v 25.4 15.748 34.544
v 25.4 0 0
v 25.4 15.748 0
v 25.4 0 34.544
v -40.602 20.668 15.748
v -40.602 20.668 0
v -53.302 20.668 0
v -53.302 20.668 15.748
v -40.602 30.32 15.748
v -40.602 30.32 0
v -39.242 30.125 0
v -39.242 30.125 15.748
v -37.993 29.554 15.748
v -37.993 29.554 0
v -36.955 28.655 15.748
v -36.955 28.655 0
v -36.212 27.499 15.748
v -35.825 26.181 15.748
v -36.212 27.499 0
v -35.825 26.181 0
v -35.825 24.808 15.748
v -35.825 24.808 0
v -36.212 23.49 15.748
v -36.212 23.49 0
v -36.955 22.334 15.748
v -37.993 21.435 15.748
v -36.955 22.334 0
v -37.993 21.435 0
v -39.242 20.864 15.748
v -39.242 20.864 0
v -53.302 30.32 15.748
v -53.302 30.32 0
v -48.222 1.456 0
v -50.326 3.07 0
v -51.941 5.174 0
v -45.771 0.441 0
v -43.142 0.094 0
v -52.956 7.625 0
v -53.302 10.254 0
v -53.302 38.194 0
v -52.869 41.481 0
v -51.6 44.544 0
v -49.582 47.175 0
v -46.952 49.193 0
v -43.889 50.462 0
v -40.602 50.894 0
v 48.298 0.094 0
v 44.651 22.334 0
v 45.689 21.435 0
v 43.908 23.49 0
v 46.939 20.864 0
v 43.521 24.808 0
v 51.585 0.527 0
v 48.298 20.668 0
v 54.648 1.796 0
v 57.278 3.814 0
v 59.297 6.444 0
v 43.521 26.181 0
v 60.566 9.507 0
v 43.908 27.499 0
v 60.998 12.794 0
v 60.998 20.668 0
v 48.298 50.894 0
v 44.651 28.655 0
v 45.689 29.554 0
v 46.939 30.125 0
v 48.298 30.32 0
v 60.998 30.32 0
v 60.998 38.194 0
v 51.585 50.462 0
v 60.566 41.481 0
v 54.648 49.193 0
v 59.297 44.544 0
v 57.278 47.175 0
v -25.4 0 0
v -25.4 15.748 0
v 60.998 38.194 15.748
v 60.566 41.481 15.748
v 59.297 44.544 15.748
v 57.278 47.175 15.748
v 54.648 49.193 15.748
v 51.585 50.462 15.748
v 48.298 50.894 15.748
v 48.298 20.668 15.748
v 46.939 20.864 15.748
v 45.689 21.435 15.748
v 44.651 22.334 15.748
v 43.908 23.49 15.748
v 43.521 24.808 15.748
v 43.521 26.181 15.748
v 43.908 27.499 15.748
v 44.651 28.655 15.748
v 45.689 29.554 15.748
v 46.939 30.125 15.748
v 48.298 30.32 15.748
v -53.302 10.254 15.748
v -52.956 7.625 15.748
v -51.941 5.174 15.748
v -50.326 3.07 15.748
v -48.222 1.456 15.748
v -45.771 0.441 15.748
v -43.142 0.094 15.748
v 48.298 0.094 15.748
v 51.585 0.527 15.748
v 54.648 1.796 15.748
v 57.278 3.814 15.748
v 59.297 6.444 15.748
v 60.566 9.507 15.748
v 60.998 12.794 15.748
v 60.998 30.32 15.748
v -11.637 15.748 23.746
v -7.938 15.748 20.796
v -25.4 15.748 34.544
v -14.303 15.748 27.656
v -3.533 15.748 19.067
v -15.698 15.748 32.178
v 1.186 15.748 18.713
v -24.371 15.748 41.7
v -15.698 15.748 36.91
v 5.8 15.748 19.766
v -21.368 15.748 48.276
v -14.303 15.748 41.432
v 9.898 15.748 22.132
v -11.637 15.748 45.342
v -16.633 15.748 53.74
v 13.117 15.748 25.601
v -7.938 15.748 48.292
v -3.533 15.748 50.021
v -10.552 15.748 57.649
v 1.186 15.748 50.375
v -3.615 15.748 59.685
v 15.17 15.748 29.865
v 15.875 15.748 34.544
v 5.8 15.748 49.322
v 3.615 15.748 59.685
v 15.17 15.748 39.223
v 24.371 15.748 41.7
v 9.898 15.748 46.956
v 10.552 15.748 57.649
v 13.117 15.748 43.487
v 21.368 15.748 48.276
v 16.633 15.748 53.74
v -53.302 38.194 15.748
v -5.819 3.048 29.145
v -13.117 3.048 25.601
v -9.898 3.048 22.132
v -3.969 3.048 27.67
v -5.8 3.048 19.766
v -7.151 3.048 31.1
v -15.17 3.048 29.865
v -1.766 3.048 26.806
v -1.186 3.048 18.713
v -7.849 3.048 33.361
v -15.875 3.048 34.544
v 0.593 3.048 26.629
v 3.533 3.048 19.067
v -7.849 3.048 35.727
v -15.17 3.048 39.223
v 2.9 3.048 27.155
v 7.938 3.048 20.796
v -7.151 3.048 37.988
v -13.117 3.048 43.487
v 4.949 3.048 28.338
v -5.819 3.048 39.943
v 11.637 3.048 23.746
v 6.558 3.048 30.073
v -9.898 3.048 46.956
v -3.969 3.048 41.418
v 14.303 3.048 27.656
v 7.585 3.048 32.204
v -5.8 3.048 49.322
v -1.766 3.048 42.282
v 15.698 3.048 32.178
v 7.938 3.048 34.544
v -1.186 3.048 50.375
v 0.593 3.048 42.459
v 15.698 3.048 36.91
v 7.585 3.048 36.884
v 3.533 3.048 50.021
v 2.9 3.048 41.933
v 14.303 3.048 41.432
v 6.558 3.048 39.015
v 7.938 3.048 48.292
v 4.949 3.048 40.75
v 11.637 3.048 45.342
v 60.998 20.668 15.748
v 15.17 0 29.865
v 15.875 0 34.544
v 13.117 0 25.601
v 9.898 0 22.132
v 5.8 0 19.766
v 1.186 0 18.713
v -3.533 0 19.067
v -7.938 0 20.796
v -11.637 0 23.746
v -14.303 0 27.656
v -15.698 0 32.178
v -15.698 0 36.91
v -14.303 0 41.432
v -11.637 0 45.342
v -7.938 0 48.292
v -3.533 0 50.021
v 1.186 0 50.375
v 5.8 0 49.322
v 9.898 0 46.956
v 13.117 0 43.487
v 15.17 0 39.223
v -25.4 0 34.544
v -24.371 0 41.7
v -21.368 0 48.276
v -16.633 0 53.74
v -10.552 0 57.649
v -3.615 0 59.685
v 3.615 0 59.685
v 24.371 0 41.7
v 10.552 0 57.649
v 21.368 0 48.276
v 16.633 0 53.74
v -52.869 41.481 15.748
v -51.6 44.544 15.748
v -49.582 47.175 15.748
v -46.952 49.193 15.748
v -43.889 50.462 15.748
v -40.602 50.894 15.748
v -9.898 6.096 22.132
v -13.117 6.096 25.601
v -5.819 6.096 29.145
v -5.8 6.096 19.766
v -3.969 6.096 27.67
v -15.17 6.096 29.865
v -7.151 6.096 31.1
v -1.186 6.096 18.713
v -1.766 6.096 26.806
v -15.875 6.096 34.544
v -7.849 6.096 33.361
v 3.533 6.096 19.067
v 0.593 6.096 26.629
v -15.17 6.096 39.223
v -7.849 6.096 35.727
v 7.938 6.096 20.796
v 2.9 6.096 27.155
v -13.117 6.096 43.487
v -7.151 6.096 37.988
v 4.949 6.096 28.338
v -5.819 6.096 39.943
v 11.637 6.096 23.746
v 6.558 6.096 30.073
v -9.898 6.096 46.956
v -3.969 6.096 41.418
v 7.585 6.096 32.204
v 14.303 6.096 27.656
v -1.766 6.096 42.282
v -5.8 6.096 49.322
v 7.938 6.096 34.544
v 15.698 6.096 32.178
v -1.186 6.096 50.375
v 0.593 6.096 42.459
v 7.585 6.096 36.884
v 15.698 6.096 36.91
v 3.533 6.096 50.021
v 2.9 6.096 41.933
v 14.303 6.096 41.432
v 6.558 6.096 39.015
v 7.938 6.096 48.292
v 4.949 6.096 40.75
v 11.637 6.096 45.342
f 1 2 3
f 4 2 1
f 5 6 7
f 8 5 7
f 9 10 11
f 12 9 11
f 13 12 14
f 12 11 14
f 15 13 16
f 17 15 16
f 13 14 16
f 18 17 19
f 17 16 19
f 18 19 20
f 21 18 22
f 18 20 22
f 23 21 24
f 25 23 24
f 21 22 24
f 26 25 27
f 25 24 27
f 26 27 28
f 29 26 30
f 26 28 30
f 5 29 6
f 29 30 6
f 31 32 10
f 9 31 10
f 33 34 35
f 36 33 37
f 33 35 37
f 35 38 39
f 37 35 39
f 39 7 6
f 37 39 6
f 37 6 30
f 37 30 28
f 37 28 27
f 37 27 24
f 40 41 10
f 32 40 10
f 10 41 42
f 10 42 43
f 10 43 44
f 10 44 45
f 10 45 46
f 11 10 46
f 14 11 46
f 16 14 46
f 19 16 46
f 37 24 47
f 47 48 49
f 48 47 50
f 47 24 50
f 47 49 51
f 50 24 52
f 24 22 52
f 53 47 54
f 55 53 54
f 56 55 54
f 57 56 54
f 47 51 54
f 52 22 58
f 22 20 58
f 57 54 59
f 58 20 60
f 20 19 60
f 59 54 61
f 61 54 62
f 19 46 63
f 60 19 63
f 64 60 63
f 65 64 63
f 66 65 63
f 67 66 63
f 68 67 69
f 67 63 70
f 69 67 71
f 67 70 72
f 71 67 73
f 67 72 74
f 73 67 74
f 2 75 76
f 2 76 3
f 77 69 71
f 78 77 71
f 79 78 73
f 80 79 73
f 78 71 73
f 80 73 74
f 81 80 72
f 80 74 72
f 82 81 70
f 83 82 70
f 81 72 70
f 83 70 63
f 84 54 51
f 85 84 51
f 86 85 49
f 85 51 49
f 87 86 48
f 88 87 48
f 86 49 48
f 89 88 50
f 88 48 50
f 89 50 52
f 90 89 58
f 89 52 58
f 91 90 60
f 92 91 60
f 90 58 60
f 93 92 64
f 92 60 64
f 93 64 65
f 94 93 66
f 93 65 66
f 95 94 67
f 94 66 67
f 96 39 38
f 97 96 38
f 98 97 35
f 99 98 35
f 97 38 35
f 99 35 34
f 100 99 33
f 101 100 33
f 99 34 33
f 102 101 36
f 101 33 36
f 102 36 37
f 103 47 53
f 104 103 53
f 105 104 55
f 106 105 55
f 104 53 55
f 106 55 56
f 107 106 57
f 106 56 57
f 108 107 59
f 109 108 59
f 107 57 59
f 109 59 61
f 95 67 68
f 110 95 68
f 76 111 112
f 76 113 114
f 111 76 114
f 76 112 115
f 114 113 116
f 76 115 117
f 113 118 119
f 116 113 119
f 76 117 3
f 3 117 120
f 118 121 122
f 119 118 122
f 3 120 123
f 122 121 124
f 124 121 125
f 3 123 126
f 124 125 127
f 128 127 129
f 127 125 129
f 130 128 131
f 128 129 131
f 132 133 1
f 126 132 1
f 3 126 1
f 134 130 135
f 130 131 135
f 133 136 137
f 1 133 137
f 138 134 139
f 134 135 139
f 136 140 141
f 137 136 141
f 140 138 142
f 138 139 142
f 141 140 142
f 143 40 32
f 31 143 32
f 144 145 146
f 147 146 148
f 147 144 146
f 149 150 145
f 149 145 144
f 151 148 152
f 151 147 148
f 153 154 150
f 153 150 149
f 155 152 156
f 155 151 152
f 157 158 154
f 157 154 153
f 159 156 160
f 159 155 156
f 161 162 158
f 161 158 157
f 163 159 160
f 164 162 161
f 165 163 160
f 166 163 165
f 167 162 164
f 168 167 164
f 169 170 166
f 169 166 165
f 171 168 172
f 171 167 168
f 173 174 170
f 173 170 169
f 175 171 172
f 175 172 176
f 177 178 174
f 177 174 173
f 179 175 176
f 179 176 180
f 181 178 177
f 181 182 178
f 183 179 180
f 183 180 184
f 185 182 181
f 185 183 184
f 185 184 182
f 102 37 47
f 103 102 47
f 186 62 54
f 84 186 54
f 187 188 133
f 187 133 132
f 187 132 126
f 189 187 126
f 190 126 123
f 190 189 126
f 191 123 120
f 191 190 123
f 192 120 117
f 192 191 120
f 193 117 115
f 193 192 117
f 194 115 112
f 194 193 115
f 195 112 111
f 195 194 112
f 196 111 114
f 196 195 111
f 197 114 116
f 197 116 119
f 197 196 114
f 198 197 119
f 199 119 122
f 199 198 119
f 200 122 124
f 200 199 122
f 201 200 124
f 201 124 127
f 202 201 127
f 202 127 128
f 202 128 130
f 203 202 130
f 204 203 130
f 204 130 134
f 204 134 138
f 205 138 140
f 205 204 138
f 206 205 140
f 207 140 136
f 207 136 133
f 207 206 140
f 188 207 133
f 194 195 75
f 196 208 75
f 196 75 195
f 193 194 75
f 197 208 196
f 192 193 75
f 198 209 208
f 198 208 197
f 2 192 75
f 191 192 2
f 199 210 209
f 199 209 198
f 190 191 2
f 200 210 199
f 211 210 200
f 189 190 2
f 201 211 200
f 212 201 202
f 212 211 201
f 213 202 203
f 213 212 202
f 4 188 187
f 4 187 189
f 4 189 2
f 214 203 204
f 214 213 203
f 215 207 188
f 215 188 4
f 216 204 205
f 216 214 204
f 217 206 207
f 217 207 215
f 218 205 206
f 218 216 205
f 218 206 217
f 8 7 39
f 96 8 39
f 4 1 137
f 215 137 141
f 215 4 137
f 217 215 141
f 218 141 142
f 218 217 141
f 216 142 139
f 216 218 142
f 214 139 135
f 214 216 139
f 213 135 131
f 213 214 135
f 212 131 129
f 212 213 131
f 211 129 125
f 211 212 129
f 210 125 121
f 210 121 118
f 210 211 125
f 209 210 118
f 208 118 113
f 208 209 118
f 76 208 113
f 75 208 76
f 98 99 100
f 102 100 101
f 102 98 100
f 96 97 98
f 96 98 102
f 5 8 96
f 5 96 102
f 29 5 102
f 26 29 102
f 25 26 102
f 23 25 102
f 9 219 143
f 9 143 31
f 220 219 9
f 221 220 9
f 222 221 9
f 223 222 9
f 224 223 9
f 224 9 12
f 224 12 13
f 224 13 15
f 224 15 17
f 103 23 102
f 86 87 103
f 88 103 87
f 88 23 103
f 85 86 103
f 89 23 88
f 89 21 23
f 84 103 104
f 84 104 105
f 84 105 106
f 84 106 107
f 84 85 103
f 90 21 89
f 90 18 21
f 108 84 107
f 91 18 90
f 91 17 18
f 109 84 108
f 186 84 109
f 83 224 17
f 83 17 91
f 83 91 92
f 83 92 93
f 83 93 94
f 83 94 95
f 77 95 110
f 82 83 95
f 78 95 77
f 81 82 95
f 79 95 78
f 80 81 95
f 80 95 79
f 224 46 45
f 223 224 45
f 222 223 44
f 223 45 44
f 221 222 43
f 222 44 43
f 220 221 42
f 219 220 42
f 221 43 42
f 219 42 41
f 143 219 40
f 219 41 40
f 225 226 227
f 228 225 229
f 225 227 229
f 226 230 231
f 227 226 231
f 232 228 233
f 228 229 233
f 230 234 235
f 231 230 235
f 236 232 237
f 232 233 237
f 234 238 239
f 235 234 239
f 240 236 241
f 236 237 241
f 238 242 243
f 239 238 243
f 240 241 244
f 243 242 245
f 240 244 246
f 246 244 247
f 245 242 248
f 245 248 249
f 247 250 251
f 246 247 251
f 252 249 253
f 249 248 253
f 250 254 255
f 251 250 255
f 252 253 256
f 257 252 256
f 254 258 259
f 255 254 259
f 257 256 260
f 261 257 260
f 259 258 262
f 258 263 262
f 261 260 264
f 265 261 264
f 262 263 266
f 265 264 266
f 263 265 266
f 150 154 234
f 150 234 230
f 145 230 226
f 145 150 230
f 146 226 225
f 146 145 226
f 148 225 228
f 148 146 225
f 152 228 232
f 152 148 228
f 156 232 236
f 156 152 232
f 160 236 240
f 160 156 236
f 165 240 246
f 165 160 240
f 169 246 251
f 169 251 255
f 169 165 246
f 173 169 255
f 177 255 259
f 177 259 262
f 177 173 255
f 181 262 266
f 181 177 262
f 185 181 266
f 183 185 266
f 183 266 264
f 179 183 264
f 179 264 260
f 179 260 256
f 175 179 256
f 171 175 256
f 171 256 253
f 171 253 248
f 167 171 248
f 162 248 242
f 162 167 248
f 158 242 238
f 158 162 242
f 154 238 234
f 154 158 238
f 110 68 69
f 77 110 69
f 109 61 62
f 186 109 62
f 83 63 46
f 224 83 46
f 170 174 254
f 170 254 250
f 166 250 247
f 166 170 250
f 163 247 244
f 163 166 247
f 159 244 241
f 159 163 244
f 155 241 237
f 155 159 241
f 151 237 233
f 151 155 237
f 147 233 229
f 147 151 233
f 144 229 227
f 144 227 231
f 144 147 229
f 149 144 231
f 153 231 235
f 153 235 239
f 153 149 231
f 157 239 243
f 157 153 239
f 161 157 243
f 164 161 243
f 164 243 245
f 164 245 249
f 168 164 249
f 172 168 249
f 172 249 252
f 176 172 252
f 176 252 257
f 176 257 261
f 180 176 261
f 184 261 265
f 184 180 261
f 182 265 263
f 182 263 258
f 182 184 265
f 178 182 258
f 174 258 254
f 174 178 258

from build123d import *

# Parameters (mm, degrees)
F2_DEPTH = 15.748
F3_DEPTH = 15.748
F4_DEPTH = 3.048
F5_DEPTH = 3.048


with BuildPart() as f2:
    # F0 (on Top) → F2 (new body)
    with BuildSketch(Plane.XY):
        with BuildLine():
            ThreePointArc((-53.3017574266, 10.254479922), (-50.3259623234, 3.0702750251), (-43.1417574266, 0.094479922))
            Line((-43.1417574266, 0.094479922), (48.2982425734, 0.094479922))
            ThreePointArc((48.2982425734, 0.094479922), (57.2784986945, 3.8142238009), (60.9982425734, 12.794479922))
            Line((60.9982425734, 12.794479922), (60.9982425734, 20.668479922))
            Line((60.9982425734, 20.668479922), (48.2982425734, 20.668479922))
            ThreePointArc((48.2982425734, 20.668479922), (43.4722425734, 25.494479922), (48.2982425734, 30.320479922))
            Line((48.2982425734, 30.320479922), (60.9982425734, 30.320479922))
            Line((60.9982425734, 30.320479922), (60.9982425734, 38.194479922))
            ThreePointArc((60.9982425734, 38.194479922), (57.2784986945, 47.1747360431), (48.2982425734, 50.894479922))
            Line((48.2982425734, 50.894479922), (-40.6017574266, 50.894479922))
            ThreePointArc((-40.6017574266, 50.894479922), (-49.5820135476, 47.1747360431), (-53.3017574266, 38.194479922))
            Line((-53.3017574266, 38.194479922), (-53.3017574266, 30.320479922))
            Line((-53.3017574266, 30.320479922), (-40.6017574266, 30.320479922))
            ThreePointArc((-40.6017574266, 30.320479922), (-35.7757574266, 25.494479922), (-40.6017574266, 20.668479922))
            Line((-40.6017574266, 20.668479922), (-53.3017574266, 20.668479922))
            Line((-53.3017574266, 20.668479922), (-53.3017574266, 10.254479922))
        make_face()
    extrude(amount=F2_DEPTH)


with BuildPart() as f3:
    # F1 (on Front) → F3 (new body)
    with BuildSketch(Plane.XZ):
        with BuildLine():
            ThreePointArc((25.4, 34.544), (0, 59.944), (-25.4, 34.544))
            Line((-25.4, 34.544), (-15.875, 34.544))
            ThreePointArc((-15.875, 34.544), (0, 50.419), (15.875, 34.544))
            Line((15.875, 34.544), (25.4, 34.544))
        make_face()
        with BuildLine():
            Line((-25.4, 34.544), (-25.4, 0))
            Line((-25.4, 0), (25.4, 0))
            Line((25.4, 0), (25.4, 34.544))
            Line((25.4, 34.544), (15.875, 34.544))
            ThreePointArc((15.875, 34.544), (0, 18.669), (-15.875, 34.544))
            Line((-15.875, 34.544), (-25.4, 34.544))
        make_face()
    extrude(amount=-F3_DEPTH)


with BuildPart() as f4:
    # F1 (on Front) → F4 (new body)
    with BuildSketch(Plane.XZ):
        with BuildLine():
            Line((7.9375, 34.544), (-7.9375, 34.544))
            ThreePointArc((-7.9375, 34.544), (0, 26.6065), (7.9375, 34.544))
        make_face()
        with BuildLine():
            ThreePointArc((7.9375, 34.544), (0, 42.4815), (-7.9375, 34.544))
            Line((-7.9375, 34.544), (7.9375, 34.544))
        make_face()
    extrude(amount=-F4_DEPTH)


with BuildPart() as f5:
    # F1 (on Front) → F5 (new body)
    with BuildSketch(Plane.XZ):
        with BuildLine():
            ThreePointArc((15.875, 34.544), (0, 50.419), (-15.875, 34.544))
            Line((-15.875, 34.544), (-7.9375, 34.544))
            ThreePointArc((-7.9375, 34.544), (0, 42.4815), (7.9375, 34.544))
            Line((7.9375, 34.544), (15.875, 34.544))
        make_face()
        with BuildLine():
            Line((-7.9375, 34.544), (-15.875, 34.544))
            ThreePointArc((-15.875, 34.544), (0, 18.669), (15.875, 34.544))
            Line((15.875, 34.544), (7.9375, 34.544))
            ThreePointArc((7.9375, 34.544), (0, 26.6065), (-7.9375, 34.544))
        make_face()
    extrude(amount=-F5_DEPTH)

    # F6: cut F4
    add(f4.part, mode=Mode.SUBTRACT)


with BuildPart() as f5_1:
    # F7: moved
    add(f5.part.moved(Location((0, 3.048, 0))))


solid = Compound([f2.part, f3.part, f5_1.part])
